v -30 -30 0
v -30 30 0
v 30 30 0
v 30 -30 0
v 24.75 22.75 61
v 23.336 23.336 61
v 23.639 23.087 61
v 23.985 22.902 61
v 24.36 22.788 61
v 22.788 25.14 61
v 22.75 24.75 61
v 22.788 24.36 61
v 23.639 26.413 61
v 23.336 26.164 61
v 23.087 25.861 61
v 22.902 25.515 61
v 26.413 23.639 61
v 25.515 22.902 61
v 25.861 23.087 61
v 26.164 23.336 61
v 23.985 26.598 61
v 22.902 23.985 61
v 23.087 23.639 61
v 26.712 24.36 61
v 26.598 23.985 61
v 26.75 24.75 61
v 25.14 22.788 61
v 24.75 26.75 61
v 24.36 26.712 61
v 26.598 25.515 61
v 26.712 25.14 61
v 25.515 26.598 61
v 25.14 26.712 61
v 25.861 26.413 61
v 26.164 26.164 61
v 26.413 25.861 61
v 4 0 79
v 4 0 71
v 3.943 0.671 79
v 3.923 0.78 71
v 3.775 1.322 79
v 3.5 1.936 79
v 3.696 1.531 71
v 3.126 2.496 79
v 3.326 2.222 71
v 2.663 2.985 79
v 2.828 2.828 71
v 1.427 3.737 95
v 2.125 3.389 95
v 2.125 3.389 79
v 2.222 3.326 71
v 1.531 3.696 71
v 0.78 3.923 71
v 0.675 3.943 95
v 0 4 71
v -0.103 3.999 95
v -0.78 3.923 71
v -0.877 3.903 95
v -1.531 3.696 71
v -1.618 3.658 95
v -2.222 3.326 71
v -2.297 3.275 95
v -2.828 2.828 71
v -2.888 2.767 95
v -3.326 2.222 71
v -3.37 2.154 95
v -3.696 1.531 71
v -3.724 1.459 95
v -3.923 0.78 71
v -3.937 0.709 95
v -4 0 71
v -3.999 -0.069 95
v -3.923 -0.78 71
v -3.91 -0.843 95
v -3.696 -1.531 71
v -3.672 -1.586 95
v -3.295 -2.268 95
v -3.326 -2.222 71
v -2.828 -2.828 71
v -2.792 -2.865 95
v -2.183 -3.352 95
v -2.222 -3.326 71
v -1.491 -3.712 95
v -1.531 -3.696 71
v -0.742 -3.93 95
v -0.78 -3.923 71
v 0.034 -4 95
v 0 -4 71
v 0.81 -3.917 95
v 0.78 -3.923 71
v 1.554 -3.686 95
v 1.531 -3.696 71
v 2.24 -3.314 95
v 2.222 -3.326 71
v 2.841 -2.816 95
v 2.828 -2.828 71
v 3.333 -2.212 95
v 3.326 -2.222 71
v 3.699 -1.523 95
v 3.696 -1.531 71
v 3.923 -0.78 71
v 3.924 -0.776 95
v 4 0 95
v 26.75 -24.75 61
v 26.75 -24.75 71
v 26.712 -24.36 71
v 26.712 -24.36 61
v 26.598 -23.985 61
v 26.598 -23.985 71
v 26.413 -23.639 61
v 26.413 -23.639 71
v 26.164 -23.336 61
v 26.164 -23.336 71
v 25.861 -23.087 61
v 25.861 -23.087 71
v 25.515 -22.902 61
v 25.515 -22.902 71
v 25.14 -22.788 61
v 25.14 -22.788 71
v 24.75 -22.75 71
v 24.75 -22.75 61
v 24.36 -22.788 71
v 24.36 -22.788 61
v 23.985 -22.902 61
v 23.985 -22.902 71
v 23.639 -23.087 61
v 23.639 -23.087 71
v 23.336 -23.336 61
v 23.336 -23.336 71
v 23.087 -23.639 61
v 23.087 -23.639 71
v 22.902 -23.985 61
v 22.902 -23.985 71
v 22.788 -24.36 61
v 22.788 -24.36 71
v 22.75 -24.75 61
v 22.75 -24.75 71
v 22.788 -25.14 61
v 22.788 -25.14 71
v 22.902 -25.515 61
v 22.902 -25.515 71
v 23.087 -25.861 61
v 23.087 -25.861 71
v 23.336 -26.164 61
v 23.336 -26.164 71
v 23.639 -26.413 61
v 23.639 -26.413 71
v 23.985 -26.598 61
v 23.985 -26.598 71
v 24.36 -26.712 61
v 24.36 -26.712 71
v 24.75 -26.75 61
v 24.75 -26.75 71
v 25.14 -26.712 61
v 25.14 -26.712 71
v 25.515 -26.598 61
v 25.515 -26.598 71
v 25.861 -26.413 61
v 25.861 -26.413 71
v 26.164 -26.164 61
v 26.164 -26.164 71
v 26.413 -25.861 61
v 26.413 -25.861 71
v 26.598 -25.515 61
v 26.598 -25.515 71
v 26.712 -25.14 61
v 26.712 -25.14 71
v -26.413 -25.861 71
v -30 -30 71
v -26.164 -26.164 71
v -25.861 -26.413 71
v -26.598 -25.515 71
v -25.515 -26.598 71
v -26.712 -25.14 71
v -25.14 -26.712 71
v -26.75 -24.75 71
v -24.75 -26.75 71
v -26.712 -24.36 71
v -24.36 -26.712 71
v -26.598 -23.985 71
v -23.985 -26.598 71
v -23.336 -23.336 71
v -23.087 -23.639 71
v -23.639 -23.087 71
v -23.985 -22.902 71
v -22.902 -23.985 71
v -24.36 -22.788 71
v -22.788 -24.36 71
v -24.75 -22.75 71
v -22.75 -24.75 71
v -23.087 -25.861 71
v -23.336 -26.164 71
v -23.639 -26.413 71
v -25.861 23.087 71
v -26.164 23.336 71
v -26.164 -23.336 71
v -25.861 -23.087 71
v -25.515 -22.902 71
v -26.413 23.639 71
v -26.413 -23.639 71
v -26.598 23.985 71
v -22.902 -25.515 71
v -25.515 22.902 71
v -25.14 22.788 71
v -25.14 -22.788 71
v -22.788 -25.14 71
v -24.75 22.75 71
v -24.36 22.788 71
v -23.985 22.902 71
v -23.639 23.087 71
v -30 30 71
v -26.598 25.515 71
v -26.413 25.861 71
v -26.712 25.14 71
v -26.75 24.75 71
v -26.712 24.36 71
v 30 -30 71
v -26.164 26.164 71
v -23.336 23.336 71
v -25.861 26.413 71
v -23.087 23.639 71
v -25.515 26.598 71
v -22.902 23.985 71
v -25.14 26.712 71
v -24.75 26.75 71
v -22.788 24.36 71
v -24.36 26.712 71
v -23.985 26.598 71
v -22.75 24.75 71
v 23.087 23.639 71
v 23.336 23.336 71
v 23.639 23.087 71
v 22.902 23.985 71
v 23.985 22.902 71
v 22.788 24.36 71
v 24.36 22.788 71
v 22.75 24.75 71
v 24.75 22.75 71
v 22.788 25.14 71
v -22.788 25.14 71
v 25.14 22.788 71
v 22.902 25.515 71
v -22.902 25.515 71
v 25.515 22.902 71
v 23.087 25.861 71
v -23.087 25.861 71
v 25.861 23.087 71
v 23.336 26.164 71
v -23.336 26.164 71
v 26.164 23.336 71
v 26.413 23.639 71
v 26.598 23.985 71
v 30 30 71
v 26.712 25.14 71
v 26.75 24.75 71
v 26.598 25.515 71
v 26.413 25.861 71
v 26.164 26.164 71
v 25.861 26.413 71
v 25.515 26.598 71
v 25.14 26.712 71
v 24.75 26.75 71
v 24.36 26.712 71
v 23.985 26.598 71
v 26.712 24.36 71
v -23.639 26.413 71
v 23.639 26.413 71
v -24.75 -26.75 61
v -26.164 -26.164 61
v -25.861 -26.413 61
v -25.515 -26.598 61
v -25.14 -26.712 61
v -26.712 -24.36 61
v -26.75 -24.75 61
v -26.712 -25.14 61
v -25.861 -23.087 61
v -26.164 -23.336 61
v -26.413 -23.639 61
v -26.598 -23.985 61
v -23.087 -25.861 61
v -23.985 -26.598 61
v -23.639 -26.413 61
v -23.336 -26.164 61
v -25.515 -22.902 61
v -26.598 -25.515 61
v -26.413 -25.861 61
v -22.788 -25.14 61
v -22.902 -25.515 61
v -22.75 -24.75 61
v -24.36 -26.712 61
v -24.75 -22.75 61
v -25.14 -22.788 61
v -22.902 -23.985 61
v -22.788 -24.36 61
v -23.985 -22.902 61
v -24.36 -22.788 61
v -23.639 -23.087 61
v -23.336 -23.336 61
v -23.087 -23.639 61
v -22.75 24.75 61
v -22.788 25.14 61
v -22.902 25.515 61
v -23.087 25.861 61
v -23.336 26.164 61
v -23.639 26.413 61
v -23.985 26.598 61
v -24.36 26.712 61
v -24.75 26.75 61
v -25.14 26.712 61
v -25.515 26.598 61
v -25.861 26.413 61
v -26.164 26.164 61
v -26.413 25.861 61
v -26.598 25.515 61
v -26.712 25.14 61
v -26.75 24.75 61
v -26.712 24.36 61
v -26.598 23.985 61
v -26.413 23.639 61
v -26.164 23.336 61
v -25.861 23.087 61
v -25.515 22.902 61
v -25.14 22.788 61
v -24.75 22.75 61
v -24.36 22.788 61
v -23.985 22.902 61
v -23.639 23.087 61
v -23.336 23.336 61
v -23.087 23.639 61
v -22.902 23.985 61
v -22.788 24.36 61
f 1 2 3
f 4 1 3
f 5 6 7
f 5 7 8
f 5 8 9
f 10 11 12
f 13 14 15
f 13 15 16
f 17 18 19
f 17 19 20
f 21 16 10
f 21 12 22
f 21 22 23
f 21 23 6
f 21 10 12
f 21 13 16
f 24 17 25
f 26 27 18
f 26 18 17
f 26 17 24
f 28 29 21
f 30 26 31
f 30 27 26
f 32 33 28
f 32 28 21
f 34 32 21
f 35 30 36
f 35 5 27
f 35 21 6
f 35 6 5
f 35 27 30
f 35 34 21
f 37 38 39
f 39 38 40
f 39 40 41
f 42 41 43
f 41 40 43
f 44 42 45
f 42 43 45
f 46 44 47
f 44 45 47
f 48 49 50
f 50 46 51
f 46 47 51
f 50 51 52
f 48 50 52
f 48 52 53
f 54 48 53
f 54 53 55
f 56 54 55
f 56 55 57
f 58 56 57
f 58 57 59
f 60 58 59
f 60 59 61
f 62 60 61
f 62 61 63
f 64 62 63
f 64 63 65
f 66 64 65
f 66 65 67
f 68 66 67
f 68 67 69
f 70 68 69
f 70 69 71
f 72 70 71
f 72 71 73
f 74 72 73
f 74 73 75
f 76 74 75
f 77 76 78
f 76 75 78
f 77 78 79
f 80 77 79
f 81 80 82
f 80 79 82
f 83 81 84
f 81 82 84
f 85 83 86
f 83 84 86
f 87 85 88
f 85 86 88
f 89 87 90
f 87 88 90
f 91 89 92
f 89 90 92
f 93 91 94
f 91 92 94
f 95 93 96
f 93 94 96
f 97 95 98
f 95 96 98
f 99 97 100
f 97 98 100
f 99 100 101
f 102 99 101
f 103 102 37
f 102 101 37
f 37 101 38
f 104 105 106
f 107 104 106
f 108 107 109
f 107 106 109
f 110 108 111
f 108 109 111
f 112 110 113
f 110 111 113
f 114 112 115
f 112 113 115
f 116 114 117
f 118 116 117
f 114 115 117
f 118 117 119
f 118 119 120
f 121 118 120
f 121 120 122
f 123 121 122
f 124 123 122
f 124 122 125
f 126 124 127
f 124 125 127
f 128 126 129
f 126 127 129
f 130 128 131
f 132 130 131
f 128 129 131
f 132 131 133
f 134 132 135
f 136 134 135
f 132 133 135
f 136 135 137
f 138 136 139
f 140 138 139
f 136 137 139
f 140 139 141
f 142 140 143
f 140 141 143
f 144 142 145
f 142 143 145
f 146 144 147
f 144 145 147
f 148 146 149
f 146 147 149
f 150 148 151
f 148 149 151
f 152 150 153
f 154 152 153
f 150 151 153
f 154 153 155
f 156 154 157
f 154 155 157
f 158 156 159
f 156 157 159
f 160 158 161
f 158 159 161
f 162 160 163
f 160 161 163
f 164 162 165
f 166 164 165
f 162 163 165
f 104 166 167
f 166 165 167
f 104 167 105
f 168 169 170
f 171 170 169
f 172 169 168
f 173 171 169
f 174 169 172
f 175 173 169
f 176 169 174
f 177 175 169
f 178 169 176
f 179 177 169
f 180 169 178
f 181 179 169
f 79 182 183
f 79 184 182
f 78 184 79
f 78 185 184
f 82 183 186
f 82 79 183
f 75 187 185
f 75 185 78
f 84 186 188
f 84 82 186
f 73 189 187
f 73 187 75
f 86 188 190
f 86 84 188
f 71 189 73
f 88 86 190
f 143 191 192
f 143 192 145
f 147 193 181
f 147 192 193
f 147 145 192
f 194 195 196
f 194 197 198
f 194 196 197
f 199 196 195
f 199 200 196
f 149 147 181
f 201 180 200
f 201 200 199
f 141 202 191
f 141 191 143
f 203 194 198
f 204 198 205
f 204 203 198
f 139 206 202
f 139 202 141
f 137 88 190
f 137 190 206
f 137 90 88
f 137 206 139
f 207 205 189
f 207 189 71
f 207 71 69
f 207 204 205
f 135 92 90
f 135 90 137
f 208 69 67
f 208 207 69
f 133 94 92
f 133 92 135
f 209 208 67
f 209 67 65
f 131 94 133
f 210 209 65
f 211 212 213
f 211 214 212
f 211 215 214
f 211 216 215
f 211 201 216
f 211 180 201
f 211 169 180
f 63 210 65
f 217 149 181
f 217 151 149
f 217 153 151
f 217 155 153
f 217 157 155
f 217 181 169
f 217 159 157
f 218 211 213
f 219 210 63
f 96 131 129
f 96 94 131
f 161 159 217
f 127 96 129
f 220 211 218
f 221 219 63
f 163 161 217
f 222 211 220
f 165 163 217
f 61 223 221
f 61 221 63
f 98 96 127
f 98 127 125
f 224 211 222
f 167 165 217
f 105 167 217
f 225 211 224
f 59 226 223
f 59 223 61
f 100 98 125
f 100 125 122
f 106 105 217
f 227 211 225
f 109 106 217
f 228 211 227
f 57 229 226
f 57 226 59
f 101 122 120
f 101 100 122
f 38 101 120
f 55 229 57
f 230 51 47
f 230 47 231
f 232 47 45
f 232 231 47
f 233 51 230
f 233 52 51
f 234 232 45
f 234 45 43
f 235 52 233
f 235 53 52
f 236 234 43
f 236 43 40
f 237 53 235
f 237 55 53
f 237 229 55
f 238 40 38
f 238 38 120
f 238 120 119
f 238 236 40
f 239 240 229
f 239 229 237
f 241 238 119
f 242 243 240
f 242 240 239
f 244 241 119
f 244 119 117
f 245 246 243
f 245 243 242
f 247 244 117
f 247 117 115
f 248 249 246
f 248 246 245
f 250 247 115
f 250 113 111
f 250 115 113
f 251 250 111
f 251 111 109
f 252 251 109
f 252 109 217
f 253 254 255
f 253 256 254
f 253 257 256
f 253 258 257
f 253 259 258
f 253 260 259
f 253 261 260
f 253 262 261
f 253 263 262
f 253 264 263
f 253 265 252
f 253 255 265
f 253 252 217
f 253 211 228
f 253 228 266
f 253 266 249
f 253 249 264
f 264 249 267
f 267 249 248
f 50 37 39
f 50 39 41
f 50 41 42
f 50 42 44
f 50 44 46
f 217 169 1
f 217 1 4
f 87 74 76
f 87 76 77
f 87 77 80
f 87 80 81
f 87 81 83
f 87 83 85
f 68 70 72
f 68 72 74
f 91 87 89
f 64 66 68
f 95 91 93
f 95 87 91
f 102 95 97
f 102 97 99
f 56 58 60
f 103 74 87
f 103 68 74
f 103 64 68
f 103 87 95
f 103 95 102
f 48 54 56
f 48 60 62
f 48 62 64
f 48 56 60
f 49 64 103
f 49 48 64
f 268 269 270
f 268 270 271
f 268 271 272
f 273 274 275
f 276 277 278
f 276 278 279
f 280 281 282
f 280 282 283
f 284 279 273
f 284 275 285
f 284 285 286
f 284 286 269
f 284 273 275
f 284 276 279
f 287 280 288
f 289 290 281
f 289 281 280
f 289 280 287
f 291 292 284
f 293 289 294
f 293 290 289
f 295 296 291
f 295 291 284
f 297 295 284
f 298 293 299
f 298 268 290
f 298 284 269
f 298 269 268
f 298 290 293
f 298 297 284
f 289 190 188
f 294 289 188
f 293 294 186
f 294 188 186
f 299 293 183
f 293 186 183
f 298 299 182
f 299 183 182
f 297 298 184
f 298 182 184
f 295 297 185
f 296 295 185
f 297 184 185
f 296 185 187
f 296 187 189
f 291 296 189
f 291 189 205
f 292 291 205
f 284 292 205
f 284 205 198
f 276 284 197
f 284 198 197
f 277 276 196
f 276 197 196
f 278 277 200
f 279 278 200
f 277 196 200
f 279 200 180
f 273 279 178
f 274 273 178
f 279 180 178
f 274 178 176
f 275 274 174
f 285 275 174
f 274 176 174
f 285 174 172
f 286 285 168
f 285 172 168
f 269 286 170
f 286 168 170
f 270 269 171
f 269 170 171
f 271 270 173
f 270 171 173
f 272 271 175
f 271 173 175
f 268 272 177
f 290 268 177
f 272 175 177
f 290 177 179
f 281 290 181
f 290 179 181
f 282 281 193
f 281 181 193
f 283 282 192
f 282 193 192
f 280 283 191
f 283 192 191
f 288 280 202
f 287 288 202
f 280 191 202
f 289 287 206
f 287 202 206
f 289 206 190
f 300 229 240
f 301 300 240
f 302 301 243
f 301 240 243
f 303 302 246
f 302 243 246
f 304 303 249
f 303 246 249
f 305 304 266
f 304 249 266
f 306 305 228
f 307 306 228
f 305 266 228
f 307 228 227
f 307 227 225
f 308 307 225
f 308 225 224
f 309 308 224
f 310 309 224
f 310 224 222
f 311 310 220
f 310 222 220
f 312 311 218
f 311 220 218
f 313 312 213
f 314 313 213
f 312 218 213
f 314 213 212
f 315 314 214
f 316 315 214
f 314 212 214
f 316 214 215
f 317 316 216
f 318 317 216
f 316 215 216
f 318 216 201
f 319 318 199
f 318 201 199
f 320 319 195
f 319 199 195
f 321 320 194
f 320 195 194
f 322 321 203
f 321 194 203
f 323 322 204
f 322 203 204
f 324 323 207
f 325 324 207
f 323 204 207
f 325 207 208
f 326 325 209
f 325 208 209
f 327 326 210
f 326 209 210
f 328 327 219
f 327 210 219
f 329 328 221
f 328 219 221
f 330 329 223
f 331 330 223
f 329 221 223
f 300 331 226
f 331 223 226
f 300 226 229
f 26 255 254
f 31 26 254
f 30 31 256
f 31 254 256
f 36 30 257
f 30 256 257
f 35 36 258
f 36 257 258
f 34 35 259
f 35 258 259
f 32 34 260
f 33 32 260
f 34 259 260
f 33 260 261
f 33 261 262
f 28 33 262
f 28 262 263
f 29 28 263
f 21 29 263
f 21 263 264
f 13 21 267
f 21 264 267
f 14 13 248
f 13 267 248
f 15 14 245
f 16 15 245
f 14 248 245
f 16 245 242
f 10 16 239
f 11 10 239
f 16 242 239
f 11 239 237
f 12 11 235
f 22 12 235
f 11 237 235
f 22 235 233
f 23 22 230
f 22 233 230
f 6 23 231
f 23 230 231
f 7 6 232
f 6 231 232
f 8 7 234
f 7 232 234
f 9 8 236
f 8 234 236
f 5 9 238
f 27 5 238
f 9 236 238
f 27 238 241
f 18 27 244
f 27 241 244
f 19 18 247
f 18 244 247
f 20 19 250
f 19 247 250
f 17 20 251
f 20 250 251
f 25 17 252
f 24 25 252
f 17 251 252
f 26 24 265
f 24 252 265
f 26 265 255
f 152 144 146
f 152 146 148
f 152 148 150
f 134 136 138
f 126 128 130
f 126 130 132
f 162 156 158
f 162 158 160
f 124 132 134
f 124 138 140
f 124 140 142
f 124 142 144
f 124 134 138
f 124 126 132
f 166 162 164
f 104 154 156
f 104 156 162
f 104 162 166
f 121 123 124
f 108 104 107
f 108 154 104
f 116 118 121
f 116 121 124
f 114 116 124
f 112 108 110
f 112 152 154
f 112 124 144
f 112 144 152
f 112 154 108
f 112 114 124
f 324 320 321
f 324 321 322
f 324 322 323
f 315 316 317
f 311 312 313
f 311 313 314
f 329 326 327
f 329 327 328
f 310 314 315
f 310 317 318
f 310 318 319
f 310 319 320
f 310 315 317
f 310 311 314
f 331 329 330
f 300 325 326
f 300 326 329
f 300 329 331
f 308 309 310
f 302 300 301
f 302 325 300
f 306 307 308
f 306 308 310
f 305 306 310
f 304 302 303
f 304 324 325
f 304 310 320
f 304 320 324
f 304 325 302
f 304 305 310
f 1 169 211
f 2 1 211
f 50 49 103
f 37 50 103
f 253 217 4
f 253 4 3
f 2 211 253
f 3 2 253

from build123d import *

# Parameters (mm, degrees)
F0_W     = 60
F0_H     = 60
F1_DEPTH = 71
F2_R     = 2
F3_DEPTH = 10
F4_R     = 4
F5_DEPTH = 24
F7_DEPTH = 16


with BuildPart() as f1:
    # F0 (on Top) → F1 (new body)
    with BuildSketch(Plane.XY):
        Rectangle(F0_W, F0_H)
    extrude(amount=F1_DEPTH)

    # F2 (on face) → F3 (cut)
    with BuildSketch(Plane.XY.offset(71)):
        with Locations((-24.75, -24.75)):
            Circle(F2_R)
        with Locations((24.75, -24.75)):
            Circle(F2_R)
        with Locations((-24.75, 24.75)):
            Circle(F2_R)
        with Locations((24.75, 24.75)):
            Circle(F2_R)
    extrude(amount=-F3_DEPTH, mode=Mode.SUBTRACT)

    # F4 (on face) → F5 (join)
    with BuildSketch(Plane.XY.offset(71)):
        Circle(F4_R)
    extrude(amount=F5_DEPTH)

    # F6 (on face) → F7 (cut)
    with BuildSketch(Plane.XY.offset(95)):
        with BuildLine():
            Line((2.125, 3.3888604279), (4, 0))
            ThreePointArc((4, 0), (3.5, 1.9364916731), (2.125, 3.3888604279))
        make_face()
    extrude(amount=-F7_DEPTH, mode=Mode.SUBTRACT)


solid = f1.part
